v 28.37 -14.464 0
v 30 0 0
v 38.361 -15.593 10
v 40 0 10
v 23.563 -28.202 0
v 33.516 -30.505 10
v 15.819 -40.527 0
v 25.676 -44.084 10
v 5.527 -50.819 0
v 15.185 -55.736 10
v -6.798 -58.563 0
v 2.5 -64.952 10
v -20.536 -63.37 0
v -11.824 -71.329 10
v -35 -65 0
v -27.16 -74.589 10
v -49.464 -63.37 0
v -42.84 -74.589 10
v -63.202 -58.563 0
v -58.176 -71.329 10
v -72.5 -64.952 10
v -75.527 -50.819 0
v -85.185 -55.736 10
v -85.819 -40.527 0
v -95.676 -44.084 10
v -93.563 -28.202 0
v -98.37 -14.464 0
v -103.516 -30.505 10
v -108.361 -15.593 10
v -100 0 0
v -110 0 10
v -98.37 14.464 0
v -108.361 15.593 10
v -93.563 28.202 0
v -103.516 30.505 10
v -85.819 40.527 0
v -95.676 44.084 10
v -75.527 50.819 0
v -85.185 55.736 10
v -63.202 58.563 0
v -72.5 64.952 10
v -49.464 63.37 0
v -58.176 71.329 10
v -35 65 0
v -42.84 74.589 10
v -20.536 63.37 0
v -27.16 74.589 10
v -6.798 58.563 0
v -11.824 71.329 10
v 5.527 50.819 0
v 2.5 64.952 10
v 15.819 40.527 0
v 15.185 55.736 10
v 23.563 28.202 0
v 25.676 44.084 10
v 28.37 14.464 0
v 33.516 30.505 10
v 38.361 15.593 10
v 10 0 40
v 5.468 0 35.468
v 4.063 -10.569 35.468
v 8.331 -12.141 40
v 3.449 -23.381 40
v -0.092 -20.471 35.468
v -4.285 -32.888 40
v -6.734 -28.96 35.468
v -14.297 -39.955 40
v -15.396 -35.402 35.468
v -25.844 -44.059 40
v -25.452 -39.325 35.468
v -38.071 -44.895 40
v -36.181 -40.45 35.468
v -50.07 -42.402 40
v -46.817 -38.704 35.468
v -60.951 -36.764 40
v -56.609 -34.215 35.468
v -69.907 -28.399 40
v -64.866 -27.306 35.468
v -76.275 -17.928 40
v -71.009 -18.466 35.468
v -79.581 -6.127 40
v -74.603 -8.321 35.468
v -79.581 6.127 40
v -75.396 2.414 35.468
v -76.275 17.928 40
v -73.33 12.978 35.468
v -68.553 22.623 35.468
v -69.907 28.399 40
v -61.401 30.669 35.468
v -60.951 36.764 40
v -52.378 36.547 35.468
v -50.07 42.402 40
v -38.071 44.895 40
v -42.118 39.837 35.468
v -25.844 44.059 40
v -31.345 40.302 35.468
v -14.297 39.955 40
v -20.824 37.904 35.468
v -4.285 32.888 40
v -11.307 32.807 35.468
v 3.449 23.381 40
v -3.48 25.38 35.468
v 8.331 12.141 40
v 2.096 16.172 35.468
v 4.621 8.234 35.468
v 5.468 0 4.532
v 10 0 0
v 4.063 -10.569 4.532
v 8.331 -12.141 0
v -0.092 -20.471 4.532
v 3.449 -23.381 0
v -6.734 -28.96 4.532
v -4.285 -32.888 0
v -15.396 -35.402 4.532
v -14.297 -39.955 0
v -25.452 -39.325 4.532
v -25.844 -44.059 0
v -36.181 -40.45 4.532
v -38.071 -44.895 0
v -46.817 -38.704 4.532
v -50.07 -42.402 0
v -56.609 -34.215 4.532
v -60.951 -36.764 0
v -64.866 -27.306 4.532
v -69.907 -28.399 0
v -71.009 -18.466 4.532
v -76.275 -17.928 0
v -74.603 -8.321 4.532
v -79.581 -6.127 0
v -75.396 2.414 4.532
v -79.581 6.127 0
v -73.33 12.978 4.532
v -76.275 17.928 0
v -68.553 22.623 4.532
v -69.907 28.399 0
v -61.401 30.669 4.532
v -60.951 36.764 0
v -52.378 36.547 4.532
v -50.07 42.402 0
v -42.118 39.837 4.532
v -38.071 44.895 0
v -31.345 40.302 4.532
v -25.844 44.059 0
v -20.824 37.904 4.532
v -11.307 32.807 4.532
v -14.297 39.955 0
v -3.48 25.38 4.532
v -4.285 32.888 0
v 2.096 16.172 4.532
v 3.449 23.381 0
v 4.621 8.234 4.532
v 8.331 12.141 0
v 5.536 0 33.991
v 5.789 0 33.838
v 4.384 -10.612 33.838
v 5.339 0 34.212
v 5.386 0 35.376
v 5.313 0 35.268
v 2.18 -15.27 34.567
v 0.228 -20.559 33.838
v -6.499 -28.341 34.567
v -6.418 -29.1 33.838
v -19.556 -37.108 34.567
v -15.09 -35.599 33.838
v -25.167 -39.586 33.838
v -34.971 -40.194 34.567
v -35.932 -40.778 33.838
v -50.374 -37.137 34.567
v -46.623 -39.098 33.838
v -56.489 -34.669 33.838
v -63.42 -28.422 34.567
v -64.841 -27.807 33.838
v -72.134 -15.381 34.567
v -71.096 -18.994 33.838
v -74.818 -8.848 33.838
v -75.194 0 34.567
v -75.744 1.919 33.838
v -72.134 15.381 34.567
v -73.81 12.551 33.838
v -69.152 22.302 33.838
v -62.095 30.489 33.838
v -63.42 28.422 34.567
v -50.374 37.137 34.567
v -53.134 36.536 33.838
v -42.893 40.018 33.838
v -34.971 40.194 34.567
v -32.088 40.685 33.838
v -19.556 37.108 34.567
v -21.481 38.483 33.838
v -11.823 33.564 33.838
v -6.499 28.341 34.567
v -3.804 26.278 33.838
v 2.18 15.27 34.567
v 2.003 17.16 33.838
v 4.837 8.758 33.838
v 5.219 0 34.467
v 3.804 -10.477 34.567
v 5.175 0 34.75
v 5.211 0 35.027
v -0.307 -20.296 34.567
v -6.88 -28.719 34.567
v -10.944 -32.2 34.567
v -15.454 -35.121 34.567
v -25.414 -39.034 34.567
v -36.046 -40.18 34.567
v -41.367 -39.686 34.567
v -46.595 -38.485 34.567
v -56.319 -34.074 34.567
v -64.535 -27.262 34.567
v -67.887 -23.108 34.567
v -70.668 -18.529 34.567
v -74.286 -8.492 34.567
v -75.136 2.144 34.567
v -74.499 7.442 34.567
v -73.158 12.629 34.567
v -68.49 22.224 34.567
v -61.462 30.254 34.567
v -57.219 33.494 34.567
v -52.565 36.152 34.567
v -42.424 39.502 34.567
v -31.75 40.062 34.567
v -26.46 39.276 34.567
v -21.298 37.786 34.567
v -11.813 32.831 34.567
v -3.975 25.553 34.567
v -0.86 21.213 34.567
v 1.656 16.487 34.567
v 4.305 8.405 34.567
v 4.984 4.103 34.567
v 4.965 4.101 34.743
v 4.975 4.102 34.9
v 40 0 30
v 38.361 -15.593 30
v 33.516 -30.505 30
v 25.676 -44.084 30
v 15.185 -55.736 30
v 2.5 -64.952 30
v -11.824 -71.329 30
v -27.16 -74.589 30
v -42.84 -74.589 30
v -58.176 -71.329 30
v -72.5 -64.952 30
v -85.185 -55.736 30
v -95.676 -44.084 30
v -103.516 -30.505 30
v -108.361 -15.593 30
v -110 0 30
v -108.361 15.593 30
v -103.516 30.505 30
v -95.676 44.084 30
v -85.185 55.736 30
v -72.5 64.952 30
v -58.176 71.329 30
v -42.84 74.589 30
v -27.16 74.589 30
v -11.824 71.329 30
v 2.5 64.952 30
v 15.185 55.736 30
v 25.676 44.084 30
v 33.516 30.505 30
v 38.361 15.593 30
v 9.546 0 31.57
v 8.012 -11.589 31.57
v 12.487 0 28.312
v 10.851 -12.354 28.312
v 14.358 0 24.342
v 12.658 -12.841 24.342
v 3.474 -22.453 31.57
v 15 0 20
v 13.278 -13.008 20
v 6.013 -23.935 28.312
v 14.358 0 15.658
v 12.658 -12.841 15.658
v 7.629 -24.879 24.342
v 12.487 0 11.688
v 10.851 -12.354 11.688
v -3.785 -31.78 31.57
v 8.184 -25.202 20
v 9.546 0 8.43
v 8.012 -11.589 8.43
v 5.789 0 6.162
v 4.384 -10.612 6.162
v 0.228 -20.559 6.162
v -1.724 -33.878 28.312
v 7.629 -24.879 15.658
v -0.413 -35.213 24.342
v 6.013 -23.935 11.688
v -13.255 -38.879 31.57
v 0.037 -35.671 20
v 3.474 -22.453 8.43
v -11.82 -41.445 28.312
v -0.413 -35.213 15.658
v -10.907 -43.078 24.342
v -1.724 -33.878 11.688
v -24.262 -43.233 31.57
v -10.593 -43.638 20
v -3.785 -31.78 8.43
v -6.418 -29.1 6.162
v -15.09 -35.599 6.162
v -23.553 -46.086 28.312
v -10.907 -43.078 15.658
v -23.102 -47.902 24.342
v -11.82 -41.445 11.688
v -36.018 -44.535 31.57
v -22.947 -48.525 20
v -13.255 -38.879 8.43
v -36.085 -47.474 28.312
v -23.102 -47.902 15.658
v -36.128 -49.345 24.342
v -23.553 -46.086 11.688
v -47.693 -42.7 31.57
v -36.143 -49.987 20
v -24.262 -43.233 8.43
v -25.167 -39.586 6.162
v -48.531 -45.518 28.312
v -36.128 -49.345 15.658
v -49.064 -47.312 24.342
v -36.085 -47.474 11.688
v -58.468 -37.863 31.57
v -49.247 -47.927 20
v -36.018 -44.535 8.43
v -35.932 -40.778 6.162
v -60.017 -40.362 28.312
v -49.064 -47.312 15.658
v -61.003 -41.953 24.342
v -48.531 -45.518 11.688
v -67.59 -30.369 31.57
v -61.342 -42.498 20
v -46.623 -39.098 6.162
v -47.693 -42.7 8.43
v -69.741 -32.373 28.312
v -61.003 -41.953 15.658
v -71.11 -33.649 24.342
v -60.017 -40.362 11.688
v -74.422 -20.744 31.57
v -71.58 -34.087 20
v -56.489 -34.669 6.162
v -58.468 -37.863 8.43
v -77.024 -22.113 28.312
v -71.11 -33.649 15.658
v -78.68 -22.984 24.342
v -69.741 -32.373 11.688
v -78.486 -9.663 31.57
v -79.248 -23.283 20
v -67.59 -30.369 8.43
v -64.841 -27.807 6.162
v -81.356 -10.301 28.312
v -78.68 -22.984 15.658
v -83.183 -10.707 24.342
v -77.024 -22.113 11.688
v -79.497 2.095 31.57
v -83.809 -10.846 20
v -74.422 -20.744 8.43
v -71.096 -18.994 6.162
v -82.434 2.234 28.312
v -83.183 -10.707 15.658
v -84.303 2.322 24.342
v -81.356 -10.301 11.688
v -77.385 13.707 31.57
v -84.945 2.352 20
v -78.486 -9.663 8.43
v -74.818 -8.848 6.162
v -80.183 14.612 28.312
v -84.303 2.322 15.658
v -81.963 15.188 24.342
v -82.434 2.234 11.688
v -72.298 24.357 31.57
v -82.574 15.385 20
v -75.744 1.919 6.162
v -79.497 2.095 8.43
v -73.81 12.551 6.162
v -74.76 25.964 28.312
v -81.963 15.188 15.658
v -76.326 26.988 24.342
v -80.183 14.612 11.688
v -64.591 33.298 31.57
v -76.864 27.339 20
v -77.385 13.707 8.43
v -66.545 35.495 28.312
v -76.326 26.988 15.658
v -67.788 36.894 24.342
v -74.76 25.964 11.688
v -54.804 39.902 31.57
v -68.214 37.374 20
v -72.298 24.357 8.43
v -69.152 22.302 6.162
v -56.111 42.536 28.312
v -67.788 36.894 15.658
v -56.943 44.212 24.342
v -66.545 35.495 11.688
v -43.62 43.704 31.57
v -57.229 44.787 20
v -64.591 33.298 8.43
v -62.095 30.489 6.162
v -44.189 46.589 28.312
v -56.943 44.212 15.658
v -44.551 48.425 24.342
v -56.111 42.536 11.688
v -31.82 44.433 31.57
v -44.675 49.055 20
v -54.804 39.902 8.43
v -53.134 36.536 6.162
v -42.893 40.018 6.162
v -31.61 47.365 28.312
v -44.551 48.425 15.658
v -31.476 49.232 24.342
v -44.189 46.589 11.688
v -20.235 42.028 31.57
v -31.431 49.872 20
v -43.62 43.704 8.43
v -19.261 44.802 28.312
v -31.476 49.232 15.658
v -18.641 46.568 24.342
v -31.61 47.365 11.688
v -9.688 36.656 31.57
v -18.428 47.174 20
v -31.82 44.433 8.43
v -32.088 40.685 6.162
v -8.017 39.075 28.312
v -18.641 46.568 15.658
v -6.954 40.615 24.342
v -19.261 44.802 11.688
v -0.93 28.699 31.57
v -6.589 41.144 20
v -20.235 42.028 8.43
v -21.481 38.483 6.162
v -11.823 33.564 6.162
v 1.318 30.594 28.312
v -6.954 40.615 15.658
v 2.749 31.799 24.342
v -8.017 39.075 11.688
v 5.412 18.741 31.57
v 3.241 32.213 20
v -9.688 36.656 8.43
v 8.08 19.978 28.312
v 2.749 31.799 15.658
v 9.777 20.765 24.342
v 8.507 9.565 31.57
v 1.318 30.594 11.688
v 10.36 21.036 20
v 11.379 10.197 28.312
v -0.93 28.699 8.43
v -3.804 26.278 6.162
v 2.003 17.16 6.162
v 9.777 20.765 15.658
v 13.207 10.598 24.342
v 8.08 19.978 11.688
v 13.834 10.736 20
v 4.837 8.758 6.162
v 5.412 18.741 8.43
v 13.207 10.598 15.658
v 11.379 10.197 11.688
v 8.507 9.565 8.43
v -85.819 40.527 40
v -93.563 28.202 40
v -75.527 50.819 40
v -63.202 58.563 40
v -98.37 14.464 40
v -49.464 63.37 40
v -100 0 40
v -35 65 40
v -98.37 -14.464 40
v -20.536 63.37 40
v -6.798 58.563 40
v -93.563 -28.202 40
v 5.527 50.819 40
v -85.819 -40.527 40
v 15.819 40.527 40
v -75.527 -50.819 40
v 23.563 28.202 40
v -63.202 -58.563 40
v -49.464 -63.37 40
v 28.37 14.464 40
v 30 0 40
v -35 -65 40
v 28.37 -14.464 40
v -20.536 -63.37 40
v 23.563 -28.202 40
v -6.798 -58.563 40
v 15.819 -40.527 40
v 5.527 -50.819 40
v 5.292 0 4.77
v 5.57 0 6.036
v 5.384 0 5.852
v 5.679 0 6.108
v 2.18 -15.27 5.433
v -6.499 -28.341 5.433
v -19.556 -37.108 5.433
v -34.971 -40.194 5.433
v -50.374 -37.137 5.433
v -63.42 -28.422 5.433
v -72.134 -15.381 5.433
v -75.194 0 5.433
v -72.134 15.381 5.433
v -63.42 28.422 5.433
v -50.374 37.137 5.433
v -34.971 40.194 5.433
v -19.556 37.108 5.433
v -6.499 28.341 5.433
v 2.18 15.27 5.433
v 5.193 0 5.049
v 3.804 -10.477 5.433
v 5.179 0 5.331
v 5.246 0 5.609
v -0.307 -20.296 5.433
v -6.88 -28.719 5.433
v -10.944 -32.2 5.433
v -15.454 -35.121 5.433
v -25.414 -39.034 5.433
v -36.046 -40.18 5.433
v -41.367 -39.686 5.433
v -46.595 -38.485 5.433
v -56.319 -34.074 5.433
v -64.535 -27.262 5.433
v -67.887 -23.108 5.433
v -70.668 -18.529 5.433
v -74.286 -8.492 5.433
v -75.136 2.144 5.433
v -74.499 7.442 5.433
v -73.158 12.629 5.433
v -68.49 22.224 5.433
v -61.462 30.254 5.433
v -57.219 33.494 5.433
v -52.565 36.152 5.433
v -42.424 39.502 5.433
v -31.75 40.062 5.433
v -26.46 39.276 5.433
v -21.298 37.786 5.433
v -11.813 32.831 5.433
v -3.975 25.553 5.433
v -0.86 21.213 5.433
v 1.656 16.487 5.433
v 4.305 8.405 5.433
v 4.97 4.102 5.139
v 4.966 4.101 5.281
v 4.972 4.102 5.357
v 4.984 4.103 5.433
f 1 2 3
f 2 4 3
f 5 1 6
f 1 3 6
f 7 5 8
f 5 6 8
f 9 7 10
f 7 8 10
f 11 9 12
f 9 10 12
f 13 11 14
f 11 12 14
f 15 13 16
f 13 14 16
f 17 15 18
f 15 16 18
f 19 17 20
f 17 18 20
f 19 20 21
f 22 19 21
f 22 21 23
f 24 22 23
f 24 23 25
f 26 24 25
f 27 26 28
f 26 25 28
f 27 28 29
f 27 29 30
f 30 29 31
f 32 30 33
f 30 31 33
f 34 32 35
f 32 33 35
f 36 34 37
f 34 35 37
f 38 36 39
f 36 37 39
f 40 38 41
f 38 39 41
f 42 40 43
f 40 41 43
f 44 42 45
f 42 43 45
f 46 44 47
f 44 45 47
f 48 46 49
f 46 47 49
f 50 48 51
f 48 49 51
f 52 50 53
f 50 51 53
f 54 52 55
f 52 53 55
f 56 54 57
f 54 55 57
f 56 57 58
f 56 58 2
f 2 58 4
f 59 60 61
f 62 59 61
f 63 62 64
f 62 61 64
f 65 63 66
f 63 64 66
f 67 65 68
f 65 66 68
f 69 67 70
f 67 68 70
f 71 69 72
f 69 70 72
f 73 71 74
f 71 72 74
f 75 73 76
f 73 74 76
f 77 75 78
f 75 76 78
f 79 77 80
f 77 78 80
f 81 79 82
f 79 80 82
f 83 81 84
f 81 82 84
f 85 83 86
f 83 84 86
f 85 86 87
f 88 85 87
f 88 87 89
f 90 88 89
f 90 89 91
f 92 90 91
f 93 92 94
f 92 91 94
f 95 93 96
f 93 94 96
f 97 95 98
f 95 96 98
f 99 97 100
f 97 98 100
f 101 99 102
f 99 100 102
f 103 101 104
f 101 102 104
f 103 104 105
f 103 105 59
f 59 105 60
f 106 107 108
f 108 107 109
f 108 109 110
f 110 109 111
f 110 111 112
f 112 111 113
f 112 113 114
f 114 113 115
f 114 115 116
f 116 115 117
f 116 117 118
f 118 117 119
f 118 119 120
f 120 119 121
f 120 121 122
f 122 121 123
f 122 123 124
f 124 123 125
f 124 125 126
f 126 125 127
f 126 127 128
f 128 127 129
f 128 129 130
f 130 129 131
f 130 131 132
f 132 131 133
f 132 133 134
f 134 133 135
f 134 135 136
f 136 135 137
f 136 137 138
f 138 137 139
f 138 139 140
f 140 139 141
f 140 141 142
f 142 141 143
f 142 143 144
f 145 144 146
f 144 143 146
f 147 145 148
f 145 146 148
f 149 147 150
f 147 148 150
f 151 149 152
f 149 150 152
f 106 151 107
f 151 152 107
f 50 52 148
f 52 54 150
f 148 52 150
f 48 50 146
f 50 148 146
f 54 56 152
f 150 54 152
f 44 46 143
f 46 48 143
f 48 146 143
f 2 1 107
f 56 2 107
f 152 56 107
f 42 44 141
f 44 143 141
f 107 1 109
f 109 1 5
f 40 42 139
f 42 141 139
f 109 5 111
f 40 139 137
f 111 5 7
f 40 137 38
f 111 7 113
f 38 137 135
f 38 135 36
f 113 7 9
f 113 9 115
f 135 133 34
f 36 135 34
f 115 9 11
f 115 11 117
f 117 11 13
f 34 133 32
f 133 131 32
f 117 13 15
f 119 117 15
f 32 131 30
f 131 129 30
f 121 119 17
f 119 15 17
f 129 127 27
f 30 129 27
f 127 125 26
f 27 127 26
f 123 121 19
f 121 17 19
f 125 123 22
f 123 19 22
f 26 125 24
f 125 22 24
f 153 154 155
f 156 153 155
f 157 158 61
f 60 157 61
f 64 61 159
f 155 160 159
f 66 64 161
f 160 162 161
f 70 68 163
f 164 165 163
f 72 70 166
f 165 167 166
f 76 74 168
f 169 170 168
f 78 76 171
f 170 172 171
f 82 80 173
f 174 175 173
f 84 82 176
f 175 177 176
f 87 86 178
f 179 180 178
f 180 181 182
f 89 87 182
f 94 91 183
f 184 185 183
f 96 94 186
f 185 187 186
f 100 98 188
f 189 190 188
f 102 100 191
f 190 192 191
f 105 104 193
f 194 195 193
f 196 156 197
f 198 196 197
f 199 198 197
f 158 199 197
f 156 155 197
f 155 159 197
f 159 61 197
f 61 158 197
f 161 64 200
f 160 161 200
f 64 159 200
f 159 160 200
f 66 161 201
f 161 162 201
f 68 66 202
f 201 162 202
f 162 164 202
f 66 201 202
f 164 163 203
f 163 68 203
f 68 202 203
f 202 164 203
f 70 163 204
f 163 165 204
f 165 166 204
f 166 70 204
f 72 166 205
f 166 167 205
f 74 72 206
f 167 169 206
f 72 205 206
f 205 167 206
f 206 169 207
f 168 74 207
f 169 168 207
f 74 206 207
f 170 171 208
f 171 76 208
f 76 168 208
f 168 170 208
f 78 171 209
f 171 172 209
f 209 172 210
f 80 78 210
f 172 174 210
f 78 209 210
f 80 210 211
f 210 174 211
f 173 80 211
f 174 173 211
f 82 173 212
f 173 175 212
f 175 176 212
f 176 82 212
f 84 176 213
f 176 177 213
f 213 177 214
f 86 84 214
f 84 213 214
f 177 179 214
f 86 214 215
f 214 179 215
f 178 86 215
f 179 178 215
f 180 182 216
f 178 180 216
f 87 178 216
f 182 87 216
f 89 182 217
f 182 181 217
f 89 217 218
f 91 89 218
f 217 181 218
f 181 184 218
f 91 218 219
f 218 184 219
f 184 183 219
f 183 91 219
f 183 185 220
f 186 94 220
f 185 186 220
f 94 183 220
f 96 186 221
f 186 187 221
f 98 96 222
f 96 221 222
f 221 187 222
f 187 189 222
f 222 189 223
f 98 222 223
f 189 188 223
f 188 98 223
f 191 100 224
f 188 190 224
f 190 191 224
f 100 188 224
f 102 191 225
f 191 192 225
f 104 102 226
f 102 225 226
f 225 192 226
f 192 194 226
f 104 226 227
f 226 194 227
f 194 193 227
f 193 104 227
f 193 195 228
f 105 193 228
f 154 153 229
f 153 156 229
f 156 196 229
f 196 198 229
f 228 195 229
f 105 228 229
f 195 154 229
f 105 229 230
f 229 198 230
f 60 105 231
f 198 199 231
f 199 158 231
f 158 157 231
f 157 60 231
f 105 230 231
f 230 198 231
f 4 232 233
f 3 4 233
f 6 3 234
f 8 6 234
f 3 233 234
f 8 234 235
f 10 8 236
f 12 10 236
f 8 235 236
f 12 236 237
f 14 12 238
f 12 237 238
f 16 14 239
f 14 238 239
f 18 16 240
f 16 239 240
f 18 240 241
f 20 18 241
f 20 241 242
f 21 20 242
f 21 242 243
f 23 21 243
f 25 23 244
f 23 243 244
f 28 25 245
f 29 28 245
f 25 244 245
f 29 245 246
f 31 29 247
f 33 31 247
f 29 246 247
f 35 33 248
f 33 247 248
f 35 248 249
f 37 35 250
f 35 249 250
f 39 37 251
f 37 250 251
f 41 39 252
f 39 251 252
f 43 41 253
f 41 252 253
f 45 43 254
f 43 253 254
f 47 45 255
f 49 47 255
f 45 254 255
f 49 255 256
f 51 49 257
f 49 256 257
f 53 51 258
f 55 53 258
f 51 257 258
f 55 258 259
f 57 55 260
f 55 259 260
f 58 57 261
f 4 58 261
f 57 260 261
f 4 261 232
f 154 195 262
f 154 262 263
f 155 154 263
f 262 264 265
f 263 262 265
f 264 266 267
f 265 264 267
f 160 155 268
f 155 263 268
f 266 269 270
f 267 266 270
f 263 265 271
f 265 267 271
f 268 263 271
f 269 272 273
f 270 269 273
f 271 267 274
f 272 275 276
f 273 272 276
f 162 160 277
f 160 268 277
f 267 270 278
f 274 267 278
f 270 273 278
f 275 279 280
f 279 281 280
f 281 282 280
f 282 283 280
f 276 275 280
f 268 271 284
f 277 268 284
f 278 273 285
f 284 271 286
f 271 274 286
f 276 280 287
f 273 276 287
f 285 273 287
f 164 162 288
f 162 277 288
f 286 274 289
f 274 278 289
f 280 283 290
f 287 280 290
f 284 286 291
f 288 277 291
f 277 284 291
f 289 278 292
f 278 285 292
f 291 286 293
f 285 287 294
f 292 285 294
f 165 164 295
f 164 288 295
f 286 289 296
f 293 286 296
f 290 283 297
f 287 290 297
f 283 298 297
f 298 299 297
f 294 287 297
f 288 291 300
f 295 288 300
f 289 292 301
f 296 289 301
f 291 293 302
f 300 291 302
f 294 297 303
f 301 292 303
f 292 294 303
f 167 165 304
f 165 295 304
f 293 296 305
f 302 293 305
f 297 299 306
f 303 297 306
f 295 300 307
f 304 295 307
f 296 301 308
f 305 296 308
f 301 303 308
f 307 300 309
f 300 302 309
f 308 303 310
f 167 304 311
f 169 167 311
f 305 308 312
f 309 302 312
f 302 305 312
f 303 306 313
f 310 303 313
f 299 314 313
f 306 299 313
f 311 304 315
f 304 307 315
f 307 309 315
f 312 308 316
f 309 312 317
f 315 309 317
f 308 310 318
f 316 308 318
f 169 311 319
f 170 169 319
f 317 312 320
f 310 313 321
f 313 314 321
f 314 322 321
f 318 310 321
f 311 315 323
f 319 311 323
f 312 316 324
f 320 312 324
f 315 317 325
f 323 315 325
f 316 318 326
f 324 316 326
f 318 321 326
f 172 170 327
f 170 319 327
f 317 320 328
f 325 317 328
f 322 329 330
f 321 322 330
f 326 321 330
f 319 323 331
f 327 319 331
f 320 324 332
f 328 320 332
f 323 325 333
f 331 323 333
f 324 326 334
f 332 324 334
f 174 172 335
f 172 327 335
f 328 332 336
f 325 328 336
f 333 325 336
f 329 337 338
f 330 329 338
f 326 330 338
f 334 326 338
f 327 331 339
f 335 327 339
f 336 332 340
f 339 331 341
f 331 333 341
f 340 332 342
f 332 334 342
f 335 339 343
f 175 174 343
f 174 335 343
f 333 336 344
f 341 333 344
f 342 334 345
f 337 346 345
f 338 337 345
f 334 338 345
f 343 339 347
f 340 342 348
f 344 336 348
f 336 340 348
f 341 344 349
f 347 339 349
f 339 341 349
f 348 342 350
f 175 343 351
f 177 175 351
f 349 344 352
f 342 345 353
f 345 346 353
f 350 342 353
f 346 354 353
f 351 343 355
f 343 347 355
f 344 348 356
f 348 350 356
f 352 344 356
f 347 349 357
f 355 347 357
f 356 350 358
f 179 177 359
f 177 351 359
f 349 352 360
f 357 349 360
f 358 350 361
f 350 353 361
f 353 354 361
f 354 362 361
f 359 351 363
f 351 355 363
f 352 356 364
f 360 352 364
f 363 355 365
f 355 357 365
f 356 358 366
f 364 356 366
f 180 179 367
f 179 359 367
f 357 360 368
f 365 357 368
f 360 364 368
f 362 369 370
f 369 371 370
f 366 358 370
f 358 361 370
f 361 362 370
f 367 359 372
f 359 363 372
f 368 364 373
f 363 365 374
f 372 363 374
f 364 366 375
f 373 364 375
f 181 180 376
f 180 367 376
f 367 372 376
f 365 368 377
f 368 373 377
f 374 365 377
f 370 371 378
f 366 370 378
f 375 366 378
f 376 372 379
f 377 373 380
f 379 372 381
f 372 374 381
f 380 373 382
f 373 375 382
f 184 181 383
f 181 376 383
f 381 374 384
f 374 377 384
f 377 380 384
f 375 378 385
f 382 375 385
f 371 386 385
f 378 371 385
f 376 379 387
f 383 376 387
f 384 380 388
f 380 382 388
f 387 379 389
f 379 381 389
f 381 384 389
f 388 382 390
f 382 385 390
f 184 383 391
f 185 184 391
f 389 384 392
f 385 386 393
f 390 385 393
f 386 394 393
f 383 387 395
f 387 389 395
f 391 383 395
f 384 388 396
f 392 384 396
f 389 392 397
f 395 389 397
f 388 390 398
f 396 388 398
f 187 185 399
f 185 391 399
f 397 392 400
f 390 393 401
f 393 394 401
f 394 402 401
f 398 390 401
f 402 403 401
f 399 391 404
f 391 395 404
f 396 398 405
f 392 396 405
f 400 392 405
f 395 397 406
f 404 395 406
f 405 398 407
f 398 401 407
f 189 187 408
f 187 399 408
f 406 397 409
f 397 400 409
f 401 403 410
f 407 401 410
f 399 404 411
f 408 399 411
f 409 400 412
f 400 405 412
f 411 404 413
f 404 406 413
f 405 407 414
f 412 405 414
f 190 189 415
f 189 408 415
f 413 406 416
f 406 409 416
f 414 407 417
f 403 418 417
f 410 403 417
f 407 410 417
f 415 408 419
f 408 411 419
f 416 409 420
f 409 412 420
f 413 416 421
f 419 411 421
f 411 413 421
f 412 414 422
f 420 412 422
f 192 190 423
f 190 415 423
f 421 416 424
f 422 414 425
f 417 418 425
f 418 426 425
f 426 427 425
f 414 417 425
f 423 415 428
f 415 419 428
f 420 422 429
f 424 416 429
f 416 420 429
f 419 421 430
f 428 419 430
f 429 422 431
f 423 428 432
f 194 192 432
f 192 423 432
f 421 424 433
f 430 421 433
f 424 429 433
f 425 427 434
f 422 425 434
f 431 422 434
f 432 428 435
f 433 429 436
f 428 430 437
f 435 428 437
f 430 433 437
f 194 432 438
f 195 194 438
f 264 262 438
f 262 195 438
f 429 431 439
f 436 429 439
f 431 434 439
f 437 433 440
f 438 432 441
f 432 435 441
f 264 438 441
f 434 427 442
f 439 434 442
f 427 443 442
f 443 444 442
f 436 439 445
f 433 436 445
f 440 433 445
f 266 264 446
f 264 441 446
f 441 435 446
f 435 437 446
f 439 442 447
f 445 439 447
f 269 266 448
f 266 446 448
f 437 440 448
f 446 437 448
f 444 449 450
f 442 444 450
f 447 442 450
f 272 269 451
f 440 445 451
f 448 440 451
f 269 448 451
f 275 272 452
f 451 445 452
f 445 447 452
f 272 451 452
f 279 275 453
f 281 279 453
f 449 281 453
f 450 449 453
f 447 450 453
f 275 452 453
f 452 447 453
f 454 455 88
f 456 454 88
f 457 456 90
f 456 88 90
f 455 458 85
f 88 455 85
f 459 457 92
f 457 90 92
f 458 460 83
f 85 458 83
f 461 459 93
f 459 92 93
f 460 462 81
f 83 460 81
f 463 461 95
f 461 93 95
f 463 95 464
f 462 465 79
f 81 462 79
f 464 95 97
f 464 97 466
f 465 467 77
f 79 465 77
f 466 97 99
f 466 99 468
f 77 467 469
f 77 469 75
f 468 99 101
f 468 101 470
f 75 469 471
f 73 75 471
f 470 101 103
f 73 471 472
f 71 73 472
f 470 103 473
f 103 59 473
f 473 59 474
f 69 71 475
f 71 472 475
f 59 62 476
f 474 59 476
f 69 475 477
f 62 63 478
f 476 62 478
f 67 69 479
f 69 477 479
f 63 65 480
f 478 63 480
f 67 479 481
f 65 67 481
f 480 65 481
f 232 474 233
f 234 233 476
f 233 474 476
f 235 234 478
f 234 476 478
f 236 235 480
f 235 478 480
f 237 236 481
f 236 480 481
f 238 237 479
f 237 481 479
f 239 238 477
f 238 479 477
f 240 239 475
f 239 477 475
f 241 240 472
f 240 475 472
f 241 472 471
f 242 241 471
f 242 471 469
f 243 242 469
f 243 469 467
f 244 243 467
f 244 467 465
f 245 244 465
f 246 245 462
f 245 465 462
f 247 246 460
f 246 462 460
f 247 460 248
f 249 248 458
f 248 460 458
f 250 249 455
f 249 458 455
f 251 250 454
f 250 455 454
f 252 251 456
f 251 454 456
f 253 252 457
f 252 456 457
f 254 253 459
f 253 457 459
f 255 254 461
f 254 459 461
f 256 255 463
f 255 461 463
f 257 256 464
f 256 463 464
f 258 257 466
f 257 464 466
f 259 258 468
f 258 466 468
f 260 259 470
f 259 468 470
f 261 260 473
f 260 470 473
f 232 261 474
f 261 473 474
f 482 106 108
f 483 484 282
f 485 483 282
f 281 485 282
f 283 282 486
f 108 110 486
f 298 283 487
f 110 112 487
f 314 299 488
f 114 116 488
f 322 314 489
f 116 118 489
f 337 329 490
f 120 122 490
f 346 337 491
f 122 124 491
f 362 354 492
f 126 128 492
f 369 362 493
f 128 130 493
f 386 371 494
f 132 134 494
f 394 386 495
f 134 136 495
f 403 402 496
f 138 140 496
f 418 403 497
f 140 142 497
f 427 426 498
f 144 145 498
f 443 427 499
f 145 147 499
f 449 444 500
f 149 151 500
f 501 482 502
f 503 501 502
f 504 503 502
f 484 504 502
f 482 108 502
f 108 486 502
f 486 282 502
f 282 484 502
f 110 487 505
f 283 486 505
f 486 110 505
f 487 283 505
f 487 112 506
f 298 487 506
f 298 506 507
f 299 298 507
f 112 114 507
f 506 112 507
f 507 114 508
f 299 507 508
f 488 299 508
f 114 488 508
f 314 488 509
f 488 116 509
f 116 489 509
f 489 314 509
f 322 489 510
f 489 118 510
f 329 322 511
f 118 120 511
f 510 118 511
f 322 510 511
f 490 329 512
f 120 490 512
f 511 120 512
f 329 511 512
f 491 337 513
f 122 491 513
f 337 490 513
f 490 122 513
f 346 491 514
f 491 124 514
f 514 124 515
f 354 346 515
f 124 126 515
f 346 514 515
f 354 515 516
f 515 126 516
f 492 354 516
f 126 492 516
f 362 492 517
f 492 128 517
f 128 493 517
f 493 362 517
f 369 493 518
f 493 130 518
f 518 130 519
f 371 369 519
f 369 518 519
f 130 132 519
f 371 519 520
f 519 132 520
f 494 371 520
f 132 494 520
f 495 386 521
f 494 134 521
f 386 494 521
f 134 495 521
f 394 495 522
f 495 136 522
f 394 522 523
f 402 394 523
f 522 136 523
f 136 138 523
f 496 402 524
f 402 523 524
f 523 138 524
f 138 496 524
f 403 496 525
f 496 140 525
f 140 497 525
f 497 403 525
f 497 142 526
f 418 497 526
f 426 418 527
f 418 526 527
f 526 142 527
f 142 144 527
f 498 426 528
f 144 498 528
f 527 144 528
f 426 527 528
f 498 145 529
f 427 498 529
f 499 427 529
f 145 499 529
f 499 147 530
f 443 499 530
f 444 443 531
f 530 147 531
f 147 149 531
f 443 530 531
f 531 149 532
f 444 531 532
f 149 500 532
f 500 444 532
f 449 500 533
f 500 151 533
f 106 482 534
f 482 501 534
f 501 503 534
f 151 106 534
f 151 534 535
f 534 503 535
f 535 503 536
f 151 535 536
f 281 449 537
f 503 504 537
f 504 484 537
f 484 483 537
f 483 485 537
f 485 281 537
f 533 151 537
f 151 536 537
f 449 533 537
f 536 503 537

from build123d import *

# Parameters (mm, degrees)
F3_R = 1


# Not quite as in the source:
# - a fillet or chamfer that OpenCascade refuses, or shapes differently, is made with other operations: its cross-section is extruded or revolved along the edge and cut away or added


with BuildPart() as f1:
    # F0 (on Front) → F1 (revolve)
    with BuildSketch(Plane.XZ):
        with BuildLine():
            Line((0, 5), (0, 0))
            Line((0, 0), (40, 0))
            Line((40, 0), (40, 40))
            Line((40, 40), (0, 40))
            Line((0, 40), (0, 35))
            ThreePointArc((0, 35), (15, 20), (0, 5))
        make_face()
    revolve(axis=Axis((-35, 0, 22.5124461576), (0, 0, -1)))

    # F2: chamfer of 10 on 4 edges, made by hand

    # F2_s1 → F2_t2 (revolve, cut)
    with BuildSketch(Plane.XZ):
        Polygon((30, 0), (40, 10), (40, 0), align=None)
    revolve(axis=Axis((-35, 0, 0), (0, 0, -1)), mode=Mode.SUBTRACT)

    # F2_s3 → F2_t4 (revolve, cut)
    with BuildSketch(Plane.XZ):
        Polygon((40, 30), (30, 40), (40, 40), align=None)
    revolve(axis=Axis((-35, 0, 40), (0, 0, -1)), mode=Mode.SUBTRACT)

    # F2_s5 → F2_t6 (revolve, cut)
    with BuildSketch(Plane.XZ):
        Polygon((0, 10), (10, 0), (0, 0), align=None)
    revolve(axis=Axis((-35, 0, 0), (0, 0, -1)), mode=Mode.SUBTRACT)

    # F2_s7 → F2_t8 (revolve, cut)
    with BuildSketch(Plane.XZ):
        Polygon((10, 40), (0, 30), (0, 40), align=None)
    revolve(axis=Axis((-35, 0, 40), (0, 0, -1)), mode=Mode.SUBTRACT)

    # F3
    f3_edges = [f1.edges().sort_by_distance(p)[0] for p in [
        (-74.354143, 0, 34.354143),
        (-74.354143, 0, 5.645857),
    ]]
    fillet(f3_edges, radius=F3_R)


solid = f1.part
